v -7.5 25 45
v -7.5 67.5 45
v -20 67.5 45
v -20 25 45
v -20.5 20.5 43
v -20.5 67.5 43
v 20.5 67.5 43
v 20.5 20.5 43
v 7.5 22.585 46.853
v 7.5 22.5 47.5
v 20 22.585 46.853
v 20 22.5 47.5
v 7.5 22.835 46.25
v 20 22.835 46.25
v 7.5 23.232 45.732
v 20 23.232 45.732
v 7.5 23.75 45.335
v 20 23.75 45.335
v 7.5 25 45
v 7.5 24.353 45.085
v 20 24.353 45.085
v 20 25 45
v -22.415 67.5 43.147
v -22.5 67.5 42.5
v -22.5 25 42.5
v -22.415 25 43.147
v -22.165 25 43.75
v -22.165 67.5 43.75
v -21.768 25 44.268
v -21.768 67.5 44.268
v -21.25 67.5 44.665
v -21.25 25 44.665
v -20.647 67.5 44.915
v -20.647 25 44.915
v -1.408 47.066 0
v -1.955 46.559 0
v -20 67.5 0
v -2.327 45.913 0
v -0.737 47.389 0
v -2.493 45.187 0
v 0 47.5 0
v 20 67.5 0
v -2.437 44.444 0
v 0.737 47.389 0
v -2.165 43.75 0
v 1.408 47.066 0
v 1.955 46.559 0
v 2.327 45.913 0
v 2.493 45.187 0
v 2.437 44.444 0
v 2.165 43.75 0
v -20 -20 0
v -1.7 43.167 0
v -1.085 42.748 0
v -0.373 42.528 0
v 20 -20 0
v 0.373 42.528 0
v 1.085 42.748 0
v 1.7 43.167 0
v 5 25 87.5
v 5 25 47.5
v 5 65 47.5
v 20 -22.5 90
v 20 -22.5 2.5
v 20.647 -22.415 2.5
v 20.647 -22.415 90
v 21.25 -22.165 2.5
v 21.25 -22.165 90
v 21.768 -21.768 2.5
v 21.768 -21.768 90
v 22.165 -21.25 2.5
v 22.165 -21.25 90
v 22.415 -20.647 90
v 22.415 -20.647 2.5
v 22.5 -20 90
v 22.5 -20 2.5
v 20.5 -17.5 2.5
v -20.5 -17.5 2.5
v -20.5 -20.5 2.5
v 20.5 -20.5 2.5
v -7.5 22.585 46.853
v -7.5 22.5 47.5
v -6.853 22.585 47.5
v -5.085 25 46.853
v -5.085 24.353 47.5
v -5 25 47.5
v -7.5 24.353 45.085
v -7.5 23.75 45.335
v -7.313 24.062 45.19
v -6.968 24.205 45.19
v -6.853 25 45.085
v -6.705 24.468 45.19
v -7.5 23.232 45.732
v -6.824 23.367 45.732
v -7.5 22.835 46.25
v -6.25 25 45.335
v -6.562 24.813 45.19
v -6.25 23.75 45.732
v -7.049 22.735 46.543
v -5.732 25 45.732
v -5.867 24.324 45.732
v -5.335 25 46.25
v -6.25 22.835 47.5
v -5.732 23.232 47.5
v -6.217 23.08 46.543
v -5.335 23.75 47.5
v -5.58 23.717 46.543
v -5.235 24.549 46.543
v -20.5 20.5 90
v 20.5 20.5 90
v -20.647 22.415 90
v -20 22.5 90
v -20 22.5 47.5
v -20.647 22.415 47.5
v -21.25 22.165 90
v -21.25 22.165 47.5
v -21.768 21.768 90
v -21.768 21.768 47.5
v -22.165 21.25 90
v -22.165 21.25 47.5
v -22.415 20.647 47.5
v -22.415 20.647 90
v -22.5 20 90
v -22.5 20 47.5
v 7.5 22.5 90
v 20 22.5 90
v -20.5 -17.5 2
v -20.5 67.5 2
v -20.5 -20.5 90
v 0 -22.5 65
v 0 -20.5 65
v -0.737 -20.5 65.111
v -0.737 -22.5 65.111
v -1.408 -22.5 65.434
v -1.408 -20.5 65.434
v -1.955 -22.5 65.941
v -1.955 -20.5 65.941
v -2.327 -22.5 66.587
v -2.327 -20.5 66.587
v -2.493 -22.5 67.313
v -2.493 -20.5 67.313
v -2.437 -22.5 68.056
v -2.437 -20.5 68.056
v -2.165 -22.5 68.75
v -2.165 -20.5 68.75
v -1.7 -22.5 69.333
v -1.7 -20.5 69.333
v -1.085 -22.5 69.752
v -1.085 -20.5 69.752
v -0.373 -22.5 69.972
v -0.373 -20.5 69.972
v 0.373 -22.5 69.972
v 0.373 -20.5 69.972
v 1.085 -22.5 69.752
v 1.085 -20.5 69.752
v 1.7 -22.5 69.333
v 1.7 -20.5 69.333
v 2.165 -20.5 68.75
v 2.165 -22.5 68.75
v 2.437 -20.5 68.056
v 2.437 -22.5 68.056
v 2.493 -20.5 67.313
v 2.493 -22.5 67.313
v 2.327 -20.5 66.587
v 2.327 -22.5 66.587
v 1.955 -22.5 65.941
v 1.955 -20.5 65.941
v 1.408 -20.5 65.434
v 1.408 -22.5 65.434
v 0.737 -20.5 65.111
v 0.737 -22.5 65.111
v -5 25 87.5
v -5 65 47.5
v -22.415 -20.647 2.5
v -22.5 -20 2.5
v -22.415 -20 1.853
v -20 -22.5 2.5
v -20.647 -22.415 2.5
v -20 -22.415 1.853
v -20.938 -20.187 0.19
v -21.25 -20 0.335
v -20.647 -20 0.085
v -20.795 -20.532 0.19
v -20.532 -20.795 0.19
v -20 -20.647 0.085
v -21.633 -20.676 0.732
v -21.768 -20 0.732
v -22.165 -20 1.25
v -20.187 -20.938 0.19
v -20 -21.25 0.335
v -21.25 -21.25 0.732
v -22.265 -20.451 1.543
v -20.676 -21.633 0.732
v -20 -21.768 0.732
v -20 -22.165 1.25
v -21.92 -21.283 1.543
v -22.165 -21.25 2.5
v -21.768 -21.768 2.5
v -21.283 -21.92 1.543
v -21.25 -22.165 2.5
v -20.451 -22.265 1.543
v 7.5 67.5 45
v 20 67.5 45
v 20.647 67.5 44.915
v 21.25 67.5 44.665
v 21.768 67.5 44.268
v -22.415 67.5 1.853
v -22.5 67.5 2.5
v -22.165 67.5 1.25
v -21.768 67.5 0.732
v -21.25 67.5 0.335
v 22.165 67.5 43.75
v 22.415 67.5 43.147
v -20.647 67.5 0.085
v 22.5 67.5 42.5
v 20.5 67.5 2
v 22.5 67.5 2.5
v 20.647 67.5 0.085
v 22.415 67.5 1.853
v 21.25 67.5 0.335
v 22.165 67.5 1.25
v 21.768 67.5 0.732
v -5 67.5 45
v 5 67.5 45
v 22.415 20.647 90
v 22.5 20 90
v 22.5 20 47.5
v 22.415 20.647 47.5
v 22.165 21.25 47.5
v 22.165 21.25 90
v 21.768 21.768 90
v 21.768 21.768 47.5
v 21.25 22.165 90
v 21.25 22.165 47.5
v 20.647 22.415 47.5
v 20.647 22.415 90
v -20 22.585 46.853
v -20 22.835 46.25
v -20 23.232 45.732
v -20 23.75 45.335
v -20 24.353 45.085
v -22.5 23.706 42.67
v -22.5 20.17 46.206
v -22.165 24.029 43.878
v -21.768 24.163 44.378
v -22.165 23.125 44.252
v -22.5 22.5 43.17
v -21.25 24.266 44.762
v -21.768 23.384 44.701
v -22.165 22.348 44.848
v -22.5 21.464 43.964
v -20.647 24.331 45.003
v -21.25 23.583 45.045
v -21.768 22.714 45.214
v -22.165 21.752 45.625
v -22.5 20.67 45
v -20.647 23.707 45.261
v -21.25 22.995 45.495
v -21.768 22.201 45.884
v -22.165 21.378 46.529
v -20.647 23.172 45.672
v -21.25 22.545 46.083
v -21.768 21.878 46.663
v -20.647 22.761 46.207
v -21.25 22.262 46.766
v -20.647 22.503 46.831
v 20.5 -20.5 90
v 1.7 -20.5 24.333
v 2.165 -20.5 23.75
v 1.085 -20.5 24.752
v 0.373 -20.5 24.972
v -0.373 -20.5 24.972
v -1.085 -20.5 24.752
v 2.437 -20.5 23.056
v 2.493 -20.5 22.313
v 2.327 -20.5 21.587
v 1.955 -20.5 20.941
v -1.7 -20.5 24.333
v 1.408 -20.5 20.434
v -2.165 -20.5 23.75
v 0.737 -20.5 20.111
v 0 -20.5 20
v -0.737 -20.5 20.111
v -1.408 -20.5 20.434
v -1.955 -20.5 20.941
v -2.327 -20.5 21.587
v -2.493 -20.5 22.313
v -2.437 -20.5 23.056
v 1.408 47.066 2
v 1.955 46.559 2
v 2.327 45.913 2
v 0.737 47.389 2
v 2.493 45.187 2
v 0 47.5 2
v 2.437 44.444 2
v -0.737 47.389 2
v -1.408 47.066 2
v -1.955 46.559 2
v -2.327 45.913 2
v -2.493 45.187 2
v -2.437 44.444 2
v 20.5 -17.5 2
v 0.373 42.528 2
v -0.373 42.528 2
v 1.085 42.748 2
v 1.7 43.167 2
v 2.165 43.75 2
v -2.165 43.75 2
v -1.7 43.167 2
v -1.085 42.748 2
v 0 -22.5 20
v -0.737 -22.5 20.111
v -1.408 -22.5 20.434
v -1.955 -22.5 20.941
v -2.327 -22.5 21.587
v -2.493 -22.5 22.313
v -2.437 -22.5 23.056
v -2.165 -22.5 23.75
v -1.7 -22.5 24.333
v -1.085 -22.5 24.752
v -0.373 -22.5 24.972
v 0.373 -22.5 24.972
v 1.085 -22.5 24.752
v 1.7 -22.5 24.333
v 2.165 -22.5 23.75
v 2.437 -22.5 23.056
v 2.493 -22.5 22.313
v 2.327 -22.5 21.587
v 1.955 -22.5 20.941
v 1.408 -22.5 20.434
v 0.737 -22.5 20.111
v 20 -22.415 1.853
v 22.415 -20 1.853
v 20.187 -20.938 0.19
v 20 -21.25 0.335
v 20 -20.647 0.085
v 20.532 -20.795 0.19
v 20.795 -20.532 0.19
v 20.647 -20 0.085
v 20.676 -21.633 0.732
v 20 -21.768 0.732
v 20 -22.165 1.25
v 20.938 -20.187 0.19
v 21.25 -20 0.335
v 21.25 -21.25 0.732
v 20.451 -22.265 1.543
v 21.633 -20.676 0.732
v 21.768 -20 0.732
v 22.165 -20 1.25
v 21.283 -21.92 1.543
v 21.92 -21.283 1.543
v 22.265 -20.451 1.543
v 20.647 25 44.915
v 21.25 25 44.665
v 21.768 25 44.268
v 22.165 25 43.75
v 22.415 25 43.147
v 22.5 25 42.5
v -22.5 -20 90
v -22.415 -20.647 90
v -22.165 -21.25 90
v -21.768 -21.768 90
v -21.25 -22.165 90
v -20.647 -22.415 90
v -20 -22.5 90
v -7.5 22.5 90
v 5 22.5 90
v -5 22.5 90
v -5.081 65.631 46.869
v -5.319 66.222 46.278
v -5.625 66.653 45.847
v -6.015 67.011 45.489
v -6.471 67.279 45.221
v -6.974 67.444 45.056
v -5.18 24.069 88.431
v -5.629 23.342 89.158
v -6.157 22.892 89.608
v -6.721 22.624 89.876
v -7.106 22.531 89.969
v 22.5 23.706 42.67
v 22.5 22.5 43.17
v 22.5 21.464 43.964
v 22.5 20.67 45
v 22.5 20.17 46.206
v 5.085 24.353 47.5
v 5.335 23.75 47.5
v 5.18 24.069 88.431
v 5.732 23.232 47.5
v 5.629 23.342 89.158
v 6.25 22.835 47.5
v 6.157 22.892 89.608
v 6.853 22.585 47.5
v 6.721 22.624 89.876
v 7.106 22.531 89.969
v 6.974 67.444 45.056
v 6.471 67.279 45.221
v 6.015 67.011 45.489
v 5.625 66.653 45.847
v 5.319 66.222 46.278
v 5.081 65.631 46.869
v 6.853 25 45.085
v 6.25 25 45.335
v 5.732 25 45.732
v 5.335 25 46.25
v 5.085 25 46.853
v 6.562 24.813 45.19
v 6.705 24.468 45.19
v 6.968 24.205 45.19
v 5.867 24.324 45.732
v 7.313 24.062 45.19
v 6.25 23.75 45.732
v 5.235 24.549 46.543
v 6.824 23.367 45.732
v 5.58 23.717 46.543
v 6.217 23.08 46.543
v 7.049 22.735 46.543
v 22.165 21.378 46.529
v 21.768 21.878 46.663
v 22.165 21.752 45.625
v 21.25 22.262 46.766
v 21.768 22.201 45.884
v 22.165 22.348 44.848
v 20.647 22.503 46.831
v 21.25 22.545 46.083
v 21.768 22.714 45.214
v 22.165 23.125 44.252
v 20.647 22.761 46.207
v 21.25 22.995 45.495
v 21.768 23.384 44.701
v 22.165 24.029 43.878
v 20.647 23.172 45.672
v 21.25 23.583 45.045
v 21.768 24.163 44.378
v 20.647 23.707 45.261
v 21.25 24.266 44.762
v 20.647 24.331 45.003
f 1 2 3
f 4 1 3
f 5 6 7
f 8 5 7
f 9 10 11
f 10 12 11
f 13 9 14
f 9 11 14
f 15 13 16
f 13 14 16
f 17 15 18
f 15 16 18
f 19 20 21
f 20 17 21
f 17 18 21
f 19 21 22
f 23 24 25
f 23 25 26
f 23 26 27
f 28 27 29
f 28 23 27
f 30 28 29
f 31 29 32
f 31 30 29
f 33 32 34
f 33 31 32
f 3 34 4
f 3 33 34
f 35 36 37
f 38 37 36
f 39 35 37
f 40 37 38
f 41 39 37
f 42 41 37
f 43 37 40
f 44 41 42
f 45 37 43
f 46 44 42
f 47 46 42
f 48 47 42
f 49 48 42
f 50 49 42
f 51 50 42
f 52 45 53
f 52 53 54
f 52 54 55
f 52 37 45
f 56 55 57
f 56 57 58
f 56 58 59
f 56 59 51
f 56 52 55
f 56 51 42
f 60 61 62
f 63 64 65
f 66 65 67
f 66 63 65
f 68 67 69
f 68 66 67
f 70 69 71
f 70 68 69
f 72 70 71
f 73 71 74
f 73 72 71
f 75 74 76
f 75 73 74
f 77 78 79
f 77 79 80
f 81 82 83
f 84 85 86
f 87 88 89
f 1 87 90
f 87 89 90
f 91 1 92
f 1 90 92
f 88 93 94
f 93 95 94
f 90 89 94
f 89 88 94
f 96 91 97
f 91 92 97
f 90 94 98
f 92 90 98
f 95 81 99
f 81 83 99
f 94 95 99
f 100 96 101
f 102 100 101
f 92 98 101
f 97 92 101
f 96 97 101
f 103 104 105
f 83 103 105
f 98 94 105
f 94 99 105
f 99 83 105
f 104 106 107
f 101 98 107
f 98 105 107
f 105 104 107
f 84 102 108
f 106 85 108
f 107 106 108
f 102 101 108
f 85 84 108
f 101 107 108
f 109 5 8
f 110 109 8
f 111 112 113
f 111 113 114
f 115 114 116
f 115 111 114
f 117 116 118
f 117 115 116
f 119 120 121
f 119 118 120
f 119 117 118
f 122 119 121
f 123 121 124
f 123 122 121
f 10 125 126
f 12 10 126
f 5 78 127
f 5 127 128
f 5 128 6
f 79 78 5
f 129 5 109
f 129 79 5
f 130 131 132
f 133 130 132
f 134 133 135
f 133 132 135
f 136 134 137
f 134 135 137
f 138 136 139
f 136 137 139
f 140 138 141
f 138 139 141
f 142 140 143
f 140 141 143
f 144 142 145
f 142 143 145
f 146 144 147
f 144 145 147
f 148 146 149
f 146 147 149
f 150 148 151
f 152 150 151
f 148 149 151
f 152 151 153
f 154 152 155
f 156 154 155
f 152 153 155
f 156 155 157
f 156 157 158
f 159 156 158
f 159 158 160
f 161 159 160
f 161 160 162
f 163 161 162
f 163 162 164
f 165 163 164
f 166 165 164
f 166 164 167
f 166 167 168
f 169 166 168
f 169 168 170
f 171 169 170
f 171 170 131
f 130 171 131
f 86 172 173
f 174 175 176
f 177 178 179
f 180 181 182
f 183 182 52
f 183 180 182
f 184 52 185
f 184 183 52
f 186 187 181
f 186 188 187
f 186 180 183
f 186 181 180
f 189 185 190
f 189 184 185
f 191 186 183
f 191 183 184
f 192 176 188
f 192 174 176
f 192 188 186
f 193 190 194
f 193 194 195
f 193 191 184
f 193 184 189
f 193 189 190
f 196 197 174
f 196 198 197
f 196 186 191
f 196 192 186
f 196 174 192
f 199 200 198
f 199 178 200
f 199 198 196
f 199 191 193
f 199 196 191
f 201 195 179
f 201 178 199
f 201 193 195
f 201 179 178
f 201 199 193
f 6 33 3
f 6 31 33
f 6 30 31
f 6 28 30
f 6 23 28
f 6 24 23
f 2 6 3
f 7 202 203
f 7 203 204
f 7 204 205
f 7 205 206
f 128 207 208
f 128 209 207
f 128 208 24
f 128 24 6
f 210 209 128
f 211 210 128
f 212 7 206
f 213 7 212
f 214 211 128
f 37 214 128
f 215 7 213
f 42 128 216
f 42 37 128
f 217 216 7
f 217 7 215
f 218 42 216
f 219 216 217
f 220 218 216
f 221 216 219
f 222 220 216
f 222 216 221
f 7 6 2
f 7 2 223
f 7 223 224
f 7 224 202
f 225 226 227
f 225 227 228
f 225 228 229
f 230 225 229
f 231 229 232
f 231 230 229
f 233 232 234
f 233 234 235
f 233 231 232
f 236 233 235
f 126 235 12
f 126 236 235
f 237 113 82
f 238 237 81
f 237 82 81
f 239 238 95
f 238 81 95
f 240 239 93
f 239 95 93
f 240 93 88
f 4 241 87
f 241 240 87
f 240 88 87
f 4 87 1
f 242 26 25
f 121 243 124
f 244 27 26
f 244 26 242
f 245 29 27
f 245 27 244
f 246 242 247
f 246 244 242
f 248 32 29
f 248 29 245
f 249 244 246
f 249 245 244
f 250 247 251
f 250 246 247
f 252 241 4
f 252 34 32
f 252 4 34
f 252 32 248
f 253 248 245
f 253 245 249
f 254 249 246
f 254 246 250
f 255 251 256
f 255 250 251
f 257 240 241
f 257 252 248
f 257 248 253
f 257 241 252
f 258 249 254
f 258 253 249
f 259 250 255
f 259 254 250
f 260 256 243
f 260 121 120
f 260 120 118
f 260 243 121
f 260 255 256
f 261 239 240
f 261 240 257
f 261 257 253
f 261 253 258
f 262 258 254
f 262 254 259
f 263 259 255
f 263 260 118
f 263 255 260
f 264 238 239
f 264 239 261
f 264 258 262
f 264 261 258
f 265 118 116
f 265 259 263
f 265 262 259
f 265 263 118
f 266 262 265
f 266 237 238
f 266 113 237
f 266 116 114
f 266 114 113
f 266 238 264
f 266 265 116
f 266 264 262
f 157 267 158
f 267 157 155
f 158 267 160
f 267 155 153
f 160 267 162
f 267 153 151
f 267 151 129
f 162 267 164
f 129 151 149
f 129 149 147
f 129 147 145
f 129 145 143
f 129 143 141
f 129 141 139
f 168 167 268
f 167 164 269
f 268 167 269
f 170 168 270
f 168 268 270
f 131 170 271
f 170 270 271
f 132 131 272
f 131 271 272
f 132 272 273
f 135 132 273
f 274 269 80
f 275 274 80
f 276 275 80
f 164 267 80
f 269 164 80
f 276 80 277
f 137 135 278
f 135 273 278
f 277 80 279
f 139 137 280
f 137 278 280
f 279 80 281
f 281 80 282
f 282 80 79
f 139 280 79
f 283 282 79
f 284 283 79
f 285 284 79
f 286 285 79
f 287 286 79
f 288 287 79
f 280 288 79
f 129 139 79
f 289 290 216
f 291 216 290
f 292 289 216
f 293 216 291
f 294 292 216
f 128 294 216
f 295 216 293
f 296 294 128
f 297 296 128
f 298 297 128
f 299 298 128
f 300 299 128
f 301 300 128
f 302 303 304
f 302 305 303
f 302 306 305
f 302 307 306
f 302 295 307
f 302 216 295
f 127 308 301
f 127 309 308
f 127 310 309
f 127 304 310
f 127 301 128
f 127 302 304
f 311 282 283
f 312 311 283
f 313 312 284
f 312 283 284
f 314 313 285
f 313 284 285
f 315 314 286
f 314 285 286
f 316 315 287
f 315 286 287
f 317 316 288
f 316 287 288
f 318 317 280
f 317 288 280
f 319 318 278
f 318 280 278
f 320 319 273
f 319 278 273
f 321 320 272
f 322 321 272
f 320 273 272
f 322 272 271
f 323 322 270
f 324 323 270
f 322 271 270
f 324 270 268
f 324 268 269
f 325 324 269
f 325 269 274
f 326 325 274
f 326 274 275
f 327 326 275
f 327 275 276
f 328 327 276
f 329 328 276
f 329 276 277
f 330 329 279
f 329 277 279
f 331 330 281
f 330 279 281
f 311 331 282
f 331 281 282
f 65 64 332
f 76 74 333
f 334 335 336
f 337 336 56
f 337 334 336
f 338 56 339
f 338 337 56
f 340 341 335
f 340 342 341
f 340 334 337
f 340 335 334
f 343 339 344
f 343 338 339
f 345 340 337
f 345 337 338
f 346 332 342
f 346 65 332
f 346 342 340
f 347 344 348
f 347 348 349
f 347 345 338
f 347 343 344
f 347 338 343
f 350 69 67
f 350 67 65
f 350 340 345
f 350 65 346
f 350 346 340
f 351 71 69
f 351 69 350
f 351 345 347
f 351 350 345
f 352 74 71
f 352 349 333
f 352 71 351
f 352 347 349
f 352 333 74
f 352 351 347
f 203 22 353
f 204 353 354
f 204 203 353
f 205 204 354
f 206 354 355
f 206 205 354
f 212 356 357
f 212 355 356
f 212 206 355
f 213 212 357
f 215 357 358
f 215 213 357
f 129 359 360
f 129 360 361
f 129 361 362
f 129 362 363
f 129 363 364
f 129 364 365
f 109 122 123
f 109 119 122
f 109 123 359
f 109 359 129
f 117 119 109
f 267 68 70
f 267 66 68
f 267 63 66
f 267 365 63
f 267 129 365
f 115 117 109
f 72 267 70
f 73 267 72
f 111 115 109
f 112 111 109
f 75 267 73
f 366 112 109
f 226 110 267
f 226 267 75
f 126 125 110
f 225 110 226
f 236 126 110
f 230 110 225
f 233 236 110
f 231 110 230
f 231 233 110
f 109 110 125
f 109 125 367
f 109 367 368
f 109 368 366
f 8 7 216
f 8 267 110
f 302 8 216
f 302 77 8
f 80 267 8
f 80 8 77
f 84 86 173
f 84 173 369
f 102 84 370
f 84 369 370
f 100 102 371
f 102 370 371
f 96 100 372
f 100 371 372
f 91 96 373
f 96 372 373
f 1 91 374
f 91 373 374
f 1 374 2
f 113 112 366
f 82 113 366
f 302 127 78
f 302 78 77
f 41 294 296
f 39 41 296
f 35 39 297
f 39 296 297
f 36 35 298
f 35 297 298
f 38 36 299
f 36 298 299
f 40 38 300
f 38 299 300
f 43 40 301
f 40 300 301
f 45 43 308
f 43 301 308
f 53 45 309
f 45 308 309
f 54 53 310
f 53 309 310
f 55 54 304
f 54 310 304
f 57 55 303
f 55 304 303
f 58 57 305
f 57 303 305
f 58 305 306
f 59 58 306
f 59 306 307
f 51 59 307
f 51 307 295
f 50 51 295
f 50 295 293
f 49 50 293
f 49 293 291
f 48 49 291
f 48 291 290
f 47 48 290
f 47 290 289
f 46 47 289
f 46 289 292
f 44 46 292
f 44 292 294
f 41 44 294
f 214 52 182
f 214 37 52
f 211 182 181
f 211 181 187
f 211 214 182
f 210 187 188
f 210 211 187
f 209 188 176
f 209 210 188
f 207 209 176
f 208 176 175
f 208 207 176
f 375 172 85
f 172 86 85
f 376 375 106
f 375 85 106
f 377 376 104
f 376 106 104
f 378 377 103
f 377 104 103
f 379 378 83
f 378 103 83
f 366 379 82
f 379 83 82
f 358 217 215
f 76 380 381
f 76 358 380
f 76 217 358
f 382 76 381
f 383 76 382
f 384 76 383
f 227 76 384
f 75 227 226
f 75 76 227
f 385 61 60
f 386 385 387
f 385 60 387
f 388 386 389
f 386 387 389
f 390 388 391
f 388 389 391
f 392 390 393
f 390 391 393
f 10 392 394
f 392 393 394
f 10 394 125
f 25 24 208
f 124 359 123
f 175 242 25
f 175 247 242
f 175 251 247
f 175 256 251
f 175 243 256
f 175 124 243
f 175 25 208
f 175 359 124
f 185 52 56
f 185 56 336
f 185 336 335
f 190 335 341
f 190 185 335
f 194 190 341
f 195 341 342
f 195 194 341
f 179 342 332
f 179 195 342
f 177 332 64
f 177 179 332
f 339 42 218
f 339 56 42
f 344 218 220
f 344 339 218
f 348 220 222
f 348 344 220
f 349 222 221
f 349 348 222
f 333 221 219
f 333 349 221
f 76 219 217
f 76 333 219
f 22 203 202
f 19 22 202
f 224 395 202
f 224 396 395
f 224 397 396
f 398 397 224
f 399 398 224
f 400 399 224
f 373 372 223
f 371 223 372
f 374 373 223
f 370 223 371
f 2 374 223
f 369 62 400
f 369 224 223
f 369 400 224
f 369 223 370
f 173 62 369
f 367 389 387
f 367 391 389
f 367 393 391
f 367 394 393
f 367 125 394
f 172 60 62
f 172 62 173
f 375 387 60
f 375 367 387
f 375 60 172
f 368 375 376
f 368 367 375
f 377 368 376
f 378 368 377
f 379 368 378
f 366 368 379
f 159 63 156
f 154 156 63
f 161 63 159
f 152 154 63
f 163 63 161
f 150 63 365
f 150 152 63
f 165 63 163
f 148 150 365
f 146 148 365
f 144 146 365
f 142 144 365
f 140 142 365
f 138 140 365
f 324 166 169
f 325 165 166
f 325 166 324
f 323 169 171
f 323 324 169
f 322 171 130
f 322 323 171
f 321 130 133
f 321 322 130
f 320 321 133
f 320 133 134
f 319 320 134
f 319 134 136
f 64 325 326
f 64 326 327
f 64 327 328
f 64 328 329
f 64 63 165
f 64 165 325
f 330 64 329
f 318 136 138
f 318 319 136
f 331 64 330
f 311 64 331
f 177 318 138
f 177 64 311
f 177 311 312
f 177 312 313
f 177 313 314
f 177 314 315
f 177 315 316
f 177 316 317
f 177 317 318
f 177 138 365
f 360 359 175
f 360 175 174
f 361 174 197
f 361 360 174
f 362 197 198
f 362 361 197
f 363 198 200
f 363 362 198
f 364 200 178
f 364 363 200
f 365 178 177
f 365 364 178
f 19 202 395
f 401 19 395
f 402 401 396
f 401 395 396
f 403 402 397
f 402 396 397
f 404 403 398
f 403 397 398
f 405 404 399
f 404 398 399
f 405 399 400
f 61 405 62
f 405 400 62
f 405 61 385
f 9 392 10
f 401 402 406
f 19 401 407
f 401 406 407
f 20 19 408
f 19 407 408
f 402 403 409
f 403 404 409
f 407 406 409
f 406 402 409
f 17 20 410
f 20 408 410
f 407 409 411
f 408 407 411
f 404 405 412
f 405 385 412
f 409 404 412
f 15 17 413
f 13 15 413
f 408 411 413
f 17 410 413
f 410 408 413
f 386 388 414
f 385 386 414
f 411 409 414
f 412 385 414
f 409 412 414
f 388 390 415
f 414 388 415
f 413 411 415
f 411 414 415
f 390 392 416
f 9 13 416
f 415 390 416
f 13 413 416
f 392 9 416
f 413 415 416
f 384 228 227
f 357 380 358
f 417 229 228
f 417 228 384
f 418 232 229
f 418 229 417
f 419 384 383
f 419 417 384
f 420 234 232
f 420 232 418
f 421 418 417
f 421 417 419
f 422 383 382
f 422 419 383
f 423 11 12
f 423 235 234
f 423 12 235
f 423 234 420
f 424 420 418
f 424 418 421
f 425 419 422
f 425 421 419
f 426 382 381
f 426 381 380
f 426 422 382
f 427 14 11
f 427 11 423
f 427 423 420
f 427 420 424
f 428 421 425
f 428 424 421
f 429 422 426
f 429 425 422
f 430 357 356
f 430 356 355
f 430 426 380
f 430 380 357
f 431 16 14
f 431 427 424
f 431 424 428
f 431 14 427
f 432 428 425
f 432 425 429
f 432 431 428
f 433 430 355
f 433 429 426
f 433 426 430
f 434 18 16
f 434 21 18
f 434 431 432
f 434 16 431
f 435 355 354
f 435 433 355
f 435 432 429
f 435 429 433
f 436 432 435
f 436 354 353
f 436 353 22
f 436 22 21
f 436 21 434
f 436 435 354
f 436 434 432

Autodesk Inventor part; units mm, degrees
ref_plane "YZ Plane" through (0, 0, 0) normal (1, 0, 0) x (0, 1, 0)
ref_plane "XZ Plane" through (0, 0, 0) normal (0, 1, 0) x (-1, 0, 0)
ref_plane "XY Plane" through (0, 0, 0) normal (0, 0, 1) x (1, 0, 0)
sketch "Sketch1" plane through (0, 0, 0) normal (0, 0, 1) x (1, 0, 0)
  line L0 (20.5, -20.5) -> (-20.5, -20.5)
  line L1 (-20.5, -20.5) -> (-20.5, 20.5)
  line L2 (-20.5, 20.5) -> (20.5, 20.5)
  line L3 (20.5, 20.5) -> (20.5, -20.5)
  line L4 (20.5, -20.5) -> (-20.5, 20.5) construction
  line L5 (-20.5, -20.5) -> (20.5, 20.5) construction
  line L6 (22.5, -22.5) -> (-22.5, -22.5)
  line L7 (-22.5, -22.5) -> (-22.5, 22.5)
  line L8 (-22.5, 22.5) -> (22.5, 22.5)
  line L9 (22.5, 22.5) -> (22.5, -22.5)
  line L10 (22.5, -22.5) -> (-22.5, 22.5) construction
  line L11 (-22.5, -22.5) -> (22.5, 22.5) construction
  point P0 (0, 0)
  dimension "d0" = 41
  dimension "d1" = 41
  dimension "d2" = 45
  dimension "d3" = 45
extrude "Extrusion1" add sketch "Sketch1" along normal blind 90
extrude "Extrusion2" add sketch "Sketch1" along normal blind 2.5 contours L0 L1 L2 L3
sketch "Sketch2" plane through (-22.5, 22.5, 0) normal (0, 1, 0) x (1, 0, 0)
  line L0 (0, 0) -> (45, 0)
  line L1 (45, 0) -> (45, -45)
  line L2 (45, -45) -> (0, -45)
  line L3 (0, -45) -> (0, 0)
  line L4 (0, -45) -> (45, 0) construction
  line L5 (45, -45) -> (0, 0) construction
  line L6 (43, -2) -> (2, -2)
  line L7 (2, -2) -> (2, -43)
  line L8 (2, -43) -> (43, -43)
  line L9 (43, -43) -> (43, -2)
  line L10 (43, -2) -> (2, -43) construction
  line L11 (2, -2) -> (43, -43) construction
  line L12 (22.5, -22.5) -> (22.5, -90) construction
  line L13 (43, -90) -> (2, -90) construction
  line L14 (22.5, -90) -> (27.5, -90) construction
  line L15 (27.5, -90) -> (17.5, -90)
  line L16 (17.5, -90) -> (17.5, -45)
  line L17 (17.5, -45) -> (27.5, -45)
  line L18 (27.5, -45) -> (27.5, -90)
  point P0 (22.5, 0)
  dimension "d8" = 45
  dimension "d9" = 45
  dimension "d10" = 41
  dimension "d11" = 41
  dimension "d16" = 5
  dimension "d17" = 10
extrude "Extrusion3" add sketch "Sketch2" along normal blind 45 contours L0 L1 L2 L3
extrude "Extrusion4" cut sketch "Sketch2" against normal blind 40 contours L9 L8 L7 L6
extrude "Extrusion5" add sketch "Sketch2" along normal blind 45 contours L2 L18 L15 L16
chamfer "Chamfer1" distance 45 angle 45 1 edges at (0, 67.5, 90)
sketch "Sketch3" plane through (-22.5, -22.5, 0) normal (0, -1, 0) x (1, 0, 0)
  line L0 (0, 0) -> (0, 90) projected
  line L1 (45, 45) -> (45, 90) construction
  line L2 (45, 90) -> (0, 90) construction
  line L3 (0, 90) -> (0, 45) construction
  line L4 (0, 45) -> (45, 45) construction
  line L5 (45, 45) -> (45, 90) construction
  line L6 (0, 45) -> (45, 45) construction
  line L7 (45, 45) -> (45, 0) construction
  line L8 (45, 0) -> (0, 0) construction
  line L9 (0, 0) -> (0, 45) construction
  line L10 (0, 45) -> (0, 90) construction
  line L11 (45, 90) -> (0, 45) construction
  line L12 (0, 45) -> (45, 0) construction
  line L13 (45, 0) -> (0, 0) construction
  line L14 (0, 0) -> (45, 45) construction
  line L15 (0, 90) -> (45, 45) construction
  point P0 (22.5, 0)
  point P1 (22.5, 67.5)
  point P2 (22.5, 22.5)
hole "Hole1" at (0, -22.5, 67.5) at (0, -22.5, 22.5) direction (0, 1, 0) diameter 5 depth 8 tip angle 118
sketch "Sketch5" plane through (0, 0, 0) normal (0, 0, -1) x (-1, 0, 0)
  line L0 (22.5, -22.5) -> (22.5, 67.5) projected
  line L1 (-22.5, -22.5) -> (22.5, -22.5) construction
  line L2 (22.5, -22.5) -> (22.5, 22.5) construction
  line L3 (22.5, 22.5) -> (-22.5, 22.5) construction
  line L4 (-22.5, 22.5) -> (-22.5, -22.5) construction
  line L5 (22.5, 22.5) -> (-22.5, 22.5) construction
  line L6 (-22.5, 22.5) -> (-22.5, 67.5) construction
  line L7 (-22.5, 67.5) -> (22.5, 67.5) construction
  line L8 (22.5, 67.5) -> (22.5, 22.5) construction
  line L9 (-22.5, 22.5) -> (22.5, 67.5) construction
  line L10 (22.5, 22.5) -> (-22.5, 67.5) construction
  point P0 (0, 0)
  point P1 (0, 45)
hole "Hole2" at (0, 45, 0) direction (0, 0, 1) diameter 5 depth 8 tip angle 118
fillet "Fillet1" radius 2.5 15 edges at (-22.5, 45, 45) (-22.5, 22.5, 67.5) (-22.5, -22.5, 45) (-22.5, 22.5, 0) (22.5, 22.5, 67.5) (22.5, 45, 45) (22.5, -22.5, 45) (22.5, 22.5, 0) (0, -22.5, 0) (-5, 22.5, 67.5) (-5, 45, 45) (-13.75, 22.5, 45) (5, 22.5, 67.5) (13.75, 22.5, 45) (5, 45, 45)
properties part number "L_connector"
